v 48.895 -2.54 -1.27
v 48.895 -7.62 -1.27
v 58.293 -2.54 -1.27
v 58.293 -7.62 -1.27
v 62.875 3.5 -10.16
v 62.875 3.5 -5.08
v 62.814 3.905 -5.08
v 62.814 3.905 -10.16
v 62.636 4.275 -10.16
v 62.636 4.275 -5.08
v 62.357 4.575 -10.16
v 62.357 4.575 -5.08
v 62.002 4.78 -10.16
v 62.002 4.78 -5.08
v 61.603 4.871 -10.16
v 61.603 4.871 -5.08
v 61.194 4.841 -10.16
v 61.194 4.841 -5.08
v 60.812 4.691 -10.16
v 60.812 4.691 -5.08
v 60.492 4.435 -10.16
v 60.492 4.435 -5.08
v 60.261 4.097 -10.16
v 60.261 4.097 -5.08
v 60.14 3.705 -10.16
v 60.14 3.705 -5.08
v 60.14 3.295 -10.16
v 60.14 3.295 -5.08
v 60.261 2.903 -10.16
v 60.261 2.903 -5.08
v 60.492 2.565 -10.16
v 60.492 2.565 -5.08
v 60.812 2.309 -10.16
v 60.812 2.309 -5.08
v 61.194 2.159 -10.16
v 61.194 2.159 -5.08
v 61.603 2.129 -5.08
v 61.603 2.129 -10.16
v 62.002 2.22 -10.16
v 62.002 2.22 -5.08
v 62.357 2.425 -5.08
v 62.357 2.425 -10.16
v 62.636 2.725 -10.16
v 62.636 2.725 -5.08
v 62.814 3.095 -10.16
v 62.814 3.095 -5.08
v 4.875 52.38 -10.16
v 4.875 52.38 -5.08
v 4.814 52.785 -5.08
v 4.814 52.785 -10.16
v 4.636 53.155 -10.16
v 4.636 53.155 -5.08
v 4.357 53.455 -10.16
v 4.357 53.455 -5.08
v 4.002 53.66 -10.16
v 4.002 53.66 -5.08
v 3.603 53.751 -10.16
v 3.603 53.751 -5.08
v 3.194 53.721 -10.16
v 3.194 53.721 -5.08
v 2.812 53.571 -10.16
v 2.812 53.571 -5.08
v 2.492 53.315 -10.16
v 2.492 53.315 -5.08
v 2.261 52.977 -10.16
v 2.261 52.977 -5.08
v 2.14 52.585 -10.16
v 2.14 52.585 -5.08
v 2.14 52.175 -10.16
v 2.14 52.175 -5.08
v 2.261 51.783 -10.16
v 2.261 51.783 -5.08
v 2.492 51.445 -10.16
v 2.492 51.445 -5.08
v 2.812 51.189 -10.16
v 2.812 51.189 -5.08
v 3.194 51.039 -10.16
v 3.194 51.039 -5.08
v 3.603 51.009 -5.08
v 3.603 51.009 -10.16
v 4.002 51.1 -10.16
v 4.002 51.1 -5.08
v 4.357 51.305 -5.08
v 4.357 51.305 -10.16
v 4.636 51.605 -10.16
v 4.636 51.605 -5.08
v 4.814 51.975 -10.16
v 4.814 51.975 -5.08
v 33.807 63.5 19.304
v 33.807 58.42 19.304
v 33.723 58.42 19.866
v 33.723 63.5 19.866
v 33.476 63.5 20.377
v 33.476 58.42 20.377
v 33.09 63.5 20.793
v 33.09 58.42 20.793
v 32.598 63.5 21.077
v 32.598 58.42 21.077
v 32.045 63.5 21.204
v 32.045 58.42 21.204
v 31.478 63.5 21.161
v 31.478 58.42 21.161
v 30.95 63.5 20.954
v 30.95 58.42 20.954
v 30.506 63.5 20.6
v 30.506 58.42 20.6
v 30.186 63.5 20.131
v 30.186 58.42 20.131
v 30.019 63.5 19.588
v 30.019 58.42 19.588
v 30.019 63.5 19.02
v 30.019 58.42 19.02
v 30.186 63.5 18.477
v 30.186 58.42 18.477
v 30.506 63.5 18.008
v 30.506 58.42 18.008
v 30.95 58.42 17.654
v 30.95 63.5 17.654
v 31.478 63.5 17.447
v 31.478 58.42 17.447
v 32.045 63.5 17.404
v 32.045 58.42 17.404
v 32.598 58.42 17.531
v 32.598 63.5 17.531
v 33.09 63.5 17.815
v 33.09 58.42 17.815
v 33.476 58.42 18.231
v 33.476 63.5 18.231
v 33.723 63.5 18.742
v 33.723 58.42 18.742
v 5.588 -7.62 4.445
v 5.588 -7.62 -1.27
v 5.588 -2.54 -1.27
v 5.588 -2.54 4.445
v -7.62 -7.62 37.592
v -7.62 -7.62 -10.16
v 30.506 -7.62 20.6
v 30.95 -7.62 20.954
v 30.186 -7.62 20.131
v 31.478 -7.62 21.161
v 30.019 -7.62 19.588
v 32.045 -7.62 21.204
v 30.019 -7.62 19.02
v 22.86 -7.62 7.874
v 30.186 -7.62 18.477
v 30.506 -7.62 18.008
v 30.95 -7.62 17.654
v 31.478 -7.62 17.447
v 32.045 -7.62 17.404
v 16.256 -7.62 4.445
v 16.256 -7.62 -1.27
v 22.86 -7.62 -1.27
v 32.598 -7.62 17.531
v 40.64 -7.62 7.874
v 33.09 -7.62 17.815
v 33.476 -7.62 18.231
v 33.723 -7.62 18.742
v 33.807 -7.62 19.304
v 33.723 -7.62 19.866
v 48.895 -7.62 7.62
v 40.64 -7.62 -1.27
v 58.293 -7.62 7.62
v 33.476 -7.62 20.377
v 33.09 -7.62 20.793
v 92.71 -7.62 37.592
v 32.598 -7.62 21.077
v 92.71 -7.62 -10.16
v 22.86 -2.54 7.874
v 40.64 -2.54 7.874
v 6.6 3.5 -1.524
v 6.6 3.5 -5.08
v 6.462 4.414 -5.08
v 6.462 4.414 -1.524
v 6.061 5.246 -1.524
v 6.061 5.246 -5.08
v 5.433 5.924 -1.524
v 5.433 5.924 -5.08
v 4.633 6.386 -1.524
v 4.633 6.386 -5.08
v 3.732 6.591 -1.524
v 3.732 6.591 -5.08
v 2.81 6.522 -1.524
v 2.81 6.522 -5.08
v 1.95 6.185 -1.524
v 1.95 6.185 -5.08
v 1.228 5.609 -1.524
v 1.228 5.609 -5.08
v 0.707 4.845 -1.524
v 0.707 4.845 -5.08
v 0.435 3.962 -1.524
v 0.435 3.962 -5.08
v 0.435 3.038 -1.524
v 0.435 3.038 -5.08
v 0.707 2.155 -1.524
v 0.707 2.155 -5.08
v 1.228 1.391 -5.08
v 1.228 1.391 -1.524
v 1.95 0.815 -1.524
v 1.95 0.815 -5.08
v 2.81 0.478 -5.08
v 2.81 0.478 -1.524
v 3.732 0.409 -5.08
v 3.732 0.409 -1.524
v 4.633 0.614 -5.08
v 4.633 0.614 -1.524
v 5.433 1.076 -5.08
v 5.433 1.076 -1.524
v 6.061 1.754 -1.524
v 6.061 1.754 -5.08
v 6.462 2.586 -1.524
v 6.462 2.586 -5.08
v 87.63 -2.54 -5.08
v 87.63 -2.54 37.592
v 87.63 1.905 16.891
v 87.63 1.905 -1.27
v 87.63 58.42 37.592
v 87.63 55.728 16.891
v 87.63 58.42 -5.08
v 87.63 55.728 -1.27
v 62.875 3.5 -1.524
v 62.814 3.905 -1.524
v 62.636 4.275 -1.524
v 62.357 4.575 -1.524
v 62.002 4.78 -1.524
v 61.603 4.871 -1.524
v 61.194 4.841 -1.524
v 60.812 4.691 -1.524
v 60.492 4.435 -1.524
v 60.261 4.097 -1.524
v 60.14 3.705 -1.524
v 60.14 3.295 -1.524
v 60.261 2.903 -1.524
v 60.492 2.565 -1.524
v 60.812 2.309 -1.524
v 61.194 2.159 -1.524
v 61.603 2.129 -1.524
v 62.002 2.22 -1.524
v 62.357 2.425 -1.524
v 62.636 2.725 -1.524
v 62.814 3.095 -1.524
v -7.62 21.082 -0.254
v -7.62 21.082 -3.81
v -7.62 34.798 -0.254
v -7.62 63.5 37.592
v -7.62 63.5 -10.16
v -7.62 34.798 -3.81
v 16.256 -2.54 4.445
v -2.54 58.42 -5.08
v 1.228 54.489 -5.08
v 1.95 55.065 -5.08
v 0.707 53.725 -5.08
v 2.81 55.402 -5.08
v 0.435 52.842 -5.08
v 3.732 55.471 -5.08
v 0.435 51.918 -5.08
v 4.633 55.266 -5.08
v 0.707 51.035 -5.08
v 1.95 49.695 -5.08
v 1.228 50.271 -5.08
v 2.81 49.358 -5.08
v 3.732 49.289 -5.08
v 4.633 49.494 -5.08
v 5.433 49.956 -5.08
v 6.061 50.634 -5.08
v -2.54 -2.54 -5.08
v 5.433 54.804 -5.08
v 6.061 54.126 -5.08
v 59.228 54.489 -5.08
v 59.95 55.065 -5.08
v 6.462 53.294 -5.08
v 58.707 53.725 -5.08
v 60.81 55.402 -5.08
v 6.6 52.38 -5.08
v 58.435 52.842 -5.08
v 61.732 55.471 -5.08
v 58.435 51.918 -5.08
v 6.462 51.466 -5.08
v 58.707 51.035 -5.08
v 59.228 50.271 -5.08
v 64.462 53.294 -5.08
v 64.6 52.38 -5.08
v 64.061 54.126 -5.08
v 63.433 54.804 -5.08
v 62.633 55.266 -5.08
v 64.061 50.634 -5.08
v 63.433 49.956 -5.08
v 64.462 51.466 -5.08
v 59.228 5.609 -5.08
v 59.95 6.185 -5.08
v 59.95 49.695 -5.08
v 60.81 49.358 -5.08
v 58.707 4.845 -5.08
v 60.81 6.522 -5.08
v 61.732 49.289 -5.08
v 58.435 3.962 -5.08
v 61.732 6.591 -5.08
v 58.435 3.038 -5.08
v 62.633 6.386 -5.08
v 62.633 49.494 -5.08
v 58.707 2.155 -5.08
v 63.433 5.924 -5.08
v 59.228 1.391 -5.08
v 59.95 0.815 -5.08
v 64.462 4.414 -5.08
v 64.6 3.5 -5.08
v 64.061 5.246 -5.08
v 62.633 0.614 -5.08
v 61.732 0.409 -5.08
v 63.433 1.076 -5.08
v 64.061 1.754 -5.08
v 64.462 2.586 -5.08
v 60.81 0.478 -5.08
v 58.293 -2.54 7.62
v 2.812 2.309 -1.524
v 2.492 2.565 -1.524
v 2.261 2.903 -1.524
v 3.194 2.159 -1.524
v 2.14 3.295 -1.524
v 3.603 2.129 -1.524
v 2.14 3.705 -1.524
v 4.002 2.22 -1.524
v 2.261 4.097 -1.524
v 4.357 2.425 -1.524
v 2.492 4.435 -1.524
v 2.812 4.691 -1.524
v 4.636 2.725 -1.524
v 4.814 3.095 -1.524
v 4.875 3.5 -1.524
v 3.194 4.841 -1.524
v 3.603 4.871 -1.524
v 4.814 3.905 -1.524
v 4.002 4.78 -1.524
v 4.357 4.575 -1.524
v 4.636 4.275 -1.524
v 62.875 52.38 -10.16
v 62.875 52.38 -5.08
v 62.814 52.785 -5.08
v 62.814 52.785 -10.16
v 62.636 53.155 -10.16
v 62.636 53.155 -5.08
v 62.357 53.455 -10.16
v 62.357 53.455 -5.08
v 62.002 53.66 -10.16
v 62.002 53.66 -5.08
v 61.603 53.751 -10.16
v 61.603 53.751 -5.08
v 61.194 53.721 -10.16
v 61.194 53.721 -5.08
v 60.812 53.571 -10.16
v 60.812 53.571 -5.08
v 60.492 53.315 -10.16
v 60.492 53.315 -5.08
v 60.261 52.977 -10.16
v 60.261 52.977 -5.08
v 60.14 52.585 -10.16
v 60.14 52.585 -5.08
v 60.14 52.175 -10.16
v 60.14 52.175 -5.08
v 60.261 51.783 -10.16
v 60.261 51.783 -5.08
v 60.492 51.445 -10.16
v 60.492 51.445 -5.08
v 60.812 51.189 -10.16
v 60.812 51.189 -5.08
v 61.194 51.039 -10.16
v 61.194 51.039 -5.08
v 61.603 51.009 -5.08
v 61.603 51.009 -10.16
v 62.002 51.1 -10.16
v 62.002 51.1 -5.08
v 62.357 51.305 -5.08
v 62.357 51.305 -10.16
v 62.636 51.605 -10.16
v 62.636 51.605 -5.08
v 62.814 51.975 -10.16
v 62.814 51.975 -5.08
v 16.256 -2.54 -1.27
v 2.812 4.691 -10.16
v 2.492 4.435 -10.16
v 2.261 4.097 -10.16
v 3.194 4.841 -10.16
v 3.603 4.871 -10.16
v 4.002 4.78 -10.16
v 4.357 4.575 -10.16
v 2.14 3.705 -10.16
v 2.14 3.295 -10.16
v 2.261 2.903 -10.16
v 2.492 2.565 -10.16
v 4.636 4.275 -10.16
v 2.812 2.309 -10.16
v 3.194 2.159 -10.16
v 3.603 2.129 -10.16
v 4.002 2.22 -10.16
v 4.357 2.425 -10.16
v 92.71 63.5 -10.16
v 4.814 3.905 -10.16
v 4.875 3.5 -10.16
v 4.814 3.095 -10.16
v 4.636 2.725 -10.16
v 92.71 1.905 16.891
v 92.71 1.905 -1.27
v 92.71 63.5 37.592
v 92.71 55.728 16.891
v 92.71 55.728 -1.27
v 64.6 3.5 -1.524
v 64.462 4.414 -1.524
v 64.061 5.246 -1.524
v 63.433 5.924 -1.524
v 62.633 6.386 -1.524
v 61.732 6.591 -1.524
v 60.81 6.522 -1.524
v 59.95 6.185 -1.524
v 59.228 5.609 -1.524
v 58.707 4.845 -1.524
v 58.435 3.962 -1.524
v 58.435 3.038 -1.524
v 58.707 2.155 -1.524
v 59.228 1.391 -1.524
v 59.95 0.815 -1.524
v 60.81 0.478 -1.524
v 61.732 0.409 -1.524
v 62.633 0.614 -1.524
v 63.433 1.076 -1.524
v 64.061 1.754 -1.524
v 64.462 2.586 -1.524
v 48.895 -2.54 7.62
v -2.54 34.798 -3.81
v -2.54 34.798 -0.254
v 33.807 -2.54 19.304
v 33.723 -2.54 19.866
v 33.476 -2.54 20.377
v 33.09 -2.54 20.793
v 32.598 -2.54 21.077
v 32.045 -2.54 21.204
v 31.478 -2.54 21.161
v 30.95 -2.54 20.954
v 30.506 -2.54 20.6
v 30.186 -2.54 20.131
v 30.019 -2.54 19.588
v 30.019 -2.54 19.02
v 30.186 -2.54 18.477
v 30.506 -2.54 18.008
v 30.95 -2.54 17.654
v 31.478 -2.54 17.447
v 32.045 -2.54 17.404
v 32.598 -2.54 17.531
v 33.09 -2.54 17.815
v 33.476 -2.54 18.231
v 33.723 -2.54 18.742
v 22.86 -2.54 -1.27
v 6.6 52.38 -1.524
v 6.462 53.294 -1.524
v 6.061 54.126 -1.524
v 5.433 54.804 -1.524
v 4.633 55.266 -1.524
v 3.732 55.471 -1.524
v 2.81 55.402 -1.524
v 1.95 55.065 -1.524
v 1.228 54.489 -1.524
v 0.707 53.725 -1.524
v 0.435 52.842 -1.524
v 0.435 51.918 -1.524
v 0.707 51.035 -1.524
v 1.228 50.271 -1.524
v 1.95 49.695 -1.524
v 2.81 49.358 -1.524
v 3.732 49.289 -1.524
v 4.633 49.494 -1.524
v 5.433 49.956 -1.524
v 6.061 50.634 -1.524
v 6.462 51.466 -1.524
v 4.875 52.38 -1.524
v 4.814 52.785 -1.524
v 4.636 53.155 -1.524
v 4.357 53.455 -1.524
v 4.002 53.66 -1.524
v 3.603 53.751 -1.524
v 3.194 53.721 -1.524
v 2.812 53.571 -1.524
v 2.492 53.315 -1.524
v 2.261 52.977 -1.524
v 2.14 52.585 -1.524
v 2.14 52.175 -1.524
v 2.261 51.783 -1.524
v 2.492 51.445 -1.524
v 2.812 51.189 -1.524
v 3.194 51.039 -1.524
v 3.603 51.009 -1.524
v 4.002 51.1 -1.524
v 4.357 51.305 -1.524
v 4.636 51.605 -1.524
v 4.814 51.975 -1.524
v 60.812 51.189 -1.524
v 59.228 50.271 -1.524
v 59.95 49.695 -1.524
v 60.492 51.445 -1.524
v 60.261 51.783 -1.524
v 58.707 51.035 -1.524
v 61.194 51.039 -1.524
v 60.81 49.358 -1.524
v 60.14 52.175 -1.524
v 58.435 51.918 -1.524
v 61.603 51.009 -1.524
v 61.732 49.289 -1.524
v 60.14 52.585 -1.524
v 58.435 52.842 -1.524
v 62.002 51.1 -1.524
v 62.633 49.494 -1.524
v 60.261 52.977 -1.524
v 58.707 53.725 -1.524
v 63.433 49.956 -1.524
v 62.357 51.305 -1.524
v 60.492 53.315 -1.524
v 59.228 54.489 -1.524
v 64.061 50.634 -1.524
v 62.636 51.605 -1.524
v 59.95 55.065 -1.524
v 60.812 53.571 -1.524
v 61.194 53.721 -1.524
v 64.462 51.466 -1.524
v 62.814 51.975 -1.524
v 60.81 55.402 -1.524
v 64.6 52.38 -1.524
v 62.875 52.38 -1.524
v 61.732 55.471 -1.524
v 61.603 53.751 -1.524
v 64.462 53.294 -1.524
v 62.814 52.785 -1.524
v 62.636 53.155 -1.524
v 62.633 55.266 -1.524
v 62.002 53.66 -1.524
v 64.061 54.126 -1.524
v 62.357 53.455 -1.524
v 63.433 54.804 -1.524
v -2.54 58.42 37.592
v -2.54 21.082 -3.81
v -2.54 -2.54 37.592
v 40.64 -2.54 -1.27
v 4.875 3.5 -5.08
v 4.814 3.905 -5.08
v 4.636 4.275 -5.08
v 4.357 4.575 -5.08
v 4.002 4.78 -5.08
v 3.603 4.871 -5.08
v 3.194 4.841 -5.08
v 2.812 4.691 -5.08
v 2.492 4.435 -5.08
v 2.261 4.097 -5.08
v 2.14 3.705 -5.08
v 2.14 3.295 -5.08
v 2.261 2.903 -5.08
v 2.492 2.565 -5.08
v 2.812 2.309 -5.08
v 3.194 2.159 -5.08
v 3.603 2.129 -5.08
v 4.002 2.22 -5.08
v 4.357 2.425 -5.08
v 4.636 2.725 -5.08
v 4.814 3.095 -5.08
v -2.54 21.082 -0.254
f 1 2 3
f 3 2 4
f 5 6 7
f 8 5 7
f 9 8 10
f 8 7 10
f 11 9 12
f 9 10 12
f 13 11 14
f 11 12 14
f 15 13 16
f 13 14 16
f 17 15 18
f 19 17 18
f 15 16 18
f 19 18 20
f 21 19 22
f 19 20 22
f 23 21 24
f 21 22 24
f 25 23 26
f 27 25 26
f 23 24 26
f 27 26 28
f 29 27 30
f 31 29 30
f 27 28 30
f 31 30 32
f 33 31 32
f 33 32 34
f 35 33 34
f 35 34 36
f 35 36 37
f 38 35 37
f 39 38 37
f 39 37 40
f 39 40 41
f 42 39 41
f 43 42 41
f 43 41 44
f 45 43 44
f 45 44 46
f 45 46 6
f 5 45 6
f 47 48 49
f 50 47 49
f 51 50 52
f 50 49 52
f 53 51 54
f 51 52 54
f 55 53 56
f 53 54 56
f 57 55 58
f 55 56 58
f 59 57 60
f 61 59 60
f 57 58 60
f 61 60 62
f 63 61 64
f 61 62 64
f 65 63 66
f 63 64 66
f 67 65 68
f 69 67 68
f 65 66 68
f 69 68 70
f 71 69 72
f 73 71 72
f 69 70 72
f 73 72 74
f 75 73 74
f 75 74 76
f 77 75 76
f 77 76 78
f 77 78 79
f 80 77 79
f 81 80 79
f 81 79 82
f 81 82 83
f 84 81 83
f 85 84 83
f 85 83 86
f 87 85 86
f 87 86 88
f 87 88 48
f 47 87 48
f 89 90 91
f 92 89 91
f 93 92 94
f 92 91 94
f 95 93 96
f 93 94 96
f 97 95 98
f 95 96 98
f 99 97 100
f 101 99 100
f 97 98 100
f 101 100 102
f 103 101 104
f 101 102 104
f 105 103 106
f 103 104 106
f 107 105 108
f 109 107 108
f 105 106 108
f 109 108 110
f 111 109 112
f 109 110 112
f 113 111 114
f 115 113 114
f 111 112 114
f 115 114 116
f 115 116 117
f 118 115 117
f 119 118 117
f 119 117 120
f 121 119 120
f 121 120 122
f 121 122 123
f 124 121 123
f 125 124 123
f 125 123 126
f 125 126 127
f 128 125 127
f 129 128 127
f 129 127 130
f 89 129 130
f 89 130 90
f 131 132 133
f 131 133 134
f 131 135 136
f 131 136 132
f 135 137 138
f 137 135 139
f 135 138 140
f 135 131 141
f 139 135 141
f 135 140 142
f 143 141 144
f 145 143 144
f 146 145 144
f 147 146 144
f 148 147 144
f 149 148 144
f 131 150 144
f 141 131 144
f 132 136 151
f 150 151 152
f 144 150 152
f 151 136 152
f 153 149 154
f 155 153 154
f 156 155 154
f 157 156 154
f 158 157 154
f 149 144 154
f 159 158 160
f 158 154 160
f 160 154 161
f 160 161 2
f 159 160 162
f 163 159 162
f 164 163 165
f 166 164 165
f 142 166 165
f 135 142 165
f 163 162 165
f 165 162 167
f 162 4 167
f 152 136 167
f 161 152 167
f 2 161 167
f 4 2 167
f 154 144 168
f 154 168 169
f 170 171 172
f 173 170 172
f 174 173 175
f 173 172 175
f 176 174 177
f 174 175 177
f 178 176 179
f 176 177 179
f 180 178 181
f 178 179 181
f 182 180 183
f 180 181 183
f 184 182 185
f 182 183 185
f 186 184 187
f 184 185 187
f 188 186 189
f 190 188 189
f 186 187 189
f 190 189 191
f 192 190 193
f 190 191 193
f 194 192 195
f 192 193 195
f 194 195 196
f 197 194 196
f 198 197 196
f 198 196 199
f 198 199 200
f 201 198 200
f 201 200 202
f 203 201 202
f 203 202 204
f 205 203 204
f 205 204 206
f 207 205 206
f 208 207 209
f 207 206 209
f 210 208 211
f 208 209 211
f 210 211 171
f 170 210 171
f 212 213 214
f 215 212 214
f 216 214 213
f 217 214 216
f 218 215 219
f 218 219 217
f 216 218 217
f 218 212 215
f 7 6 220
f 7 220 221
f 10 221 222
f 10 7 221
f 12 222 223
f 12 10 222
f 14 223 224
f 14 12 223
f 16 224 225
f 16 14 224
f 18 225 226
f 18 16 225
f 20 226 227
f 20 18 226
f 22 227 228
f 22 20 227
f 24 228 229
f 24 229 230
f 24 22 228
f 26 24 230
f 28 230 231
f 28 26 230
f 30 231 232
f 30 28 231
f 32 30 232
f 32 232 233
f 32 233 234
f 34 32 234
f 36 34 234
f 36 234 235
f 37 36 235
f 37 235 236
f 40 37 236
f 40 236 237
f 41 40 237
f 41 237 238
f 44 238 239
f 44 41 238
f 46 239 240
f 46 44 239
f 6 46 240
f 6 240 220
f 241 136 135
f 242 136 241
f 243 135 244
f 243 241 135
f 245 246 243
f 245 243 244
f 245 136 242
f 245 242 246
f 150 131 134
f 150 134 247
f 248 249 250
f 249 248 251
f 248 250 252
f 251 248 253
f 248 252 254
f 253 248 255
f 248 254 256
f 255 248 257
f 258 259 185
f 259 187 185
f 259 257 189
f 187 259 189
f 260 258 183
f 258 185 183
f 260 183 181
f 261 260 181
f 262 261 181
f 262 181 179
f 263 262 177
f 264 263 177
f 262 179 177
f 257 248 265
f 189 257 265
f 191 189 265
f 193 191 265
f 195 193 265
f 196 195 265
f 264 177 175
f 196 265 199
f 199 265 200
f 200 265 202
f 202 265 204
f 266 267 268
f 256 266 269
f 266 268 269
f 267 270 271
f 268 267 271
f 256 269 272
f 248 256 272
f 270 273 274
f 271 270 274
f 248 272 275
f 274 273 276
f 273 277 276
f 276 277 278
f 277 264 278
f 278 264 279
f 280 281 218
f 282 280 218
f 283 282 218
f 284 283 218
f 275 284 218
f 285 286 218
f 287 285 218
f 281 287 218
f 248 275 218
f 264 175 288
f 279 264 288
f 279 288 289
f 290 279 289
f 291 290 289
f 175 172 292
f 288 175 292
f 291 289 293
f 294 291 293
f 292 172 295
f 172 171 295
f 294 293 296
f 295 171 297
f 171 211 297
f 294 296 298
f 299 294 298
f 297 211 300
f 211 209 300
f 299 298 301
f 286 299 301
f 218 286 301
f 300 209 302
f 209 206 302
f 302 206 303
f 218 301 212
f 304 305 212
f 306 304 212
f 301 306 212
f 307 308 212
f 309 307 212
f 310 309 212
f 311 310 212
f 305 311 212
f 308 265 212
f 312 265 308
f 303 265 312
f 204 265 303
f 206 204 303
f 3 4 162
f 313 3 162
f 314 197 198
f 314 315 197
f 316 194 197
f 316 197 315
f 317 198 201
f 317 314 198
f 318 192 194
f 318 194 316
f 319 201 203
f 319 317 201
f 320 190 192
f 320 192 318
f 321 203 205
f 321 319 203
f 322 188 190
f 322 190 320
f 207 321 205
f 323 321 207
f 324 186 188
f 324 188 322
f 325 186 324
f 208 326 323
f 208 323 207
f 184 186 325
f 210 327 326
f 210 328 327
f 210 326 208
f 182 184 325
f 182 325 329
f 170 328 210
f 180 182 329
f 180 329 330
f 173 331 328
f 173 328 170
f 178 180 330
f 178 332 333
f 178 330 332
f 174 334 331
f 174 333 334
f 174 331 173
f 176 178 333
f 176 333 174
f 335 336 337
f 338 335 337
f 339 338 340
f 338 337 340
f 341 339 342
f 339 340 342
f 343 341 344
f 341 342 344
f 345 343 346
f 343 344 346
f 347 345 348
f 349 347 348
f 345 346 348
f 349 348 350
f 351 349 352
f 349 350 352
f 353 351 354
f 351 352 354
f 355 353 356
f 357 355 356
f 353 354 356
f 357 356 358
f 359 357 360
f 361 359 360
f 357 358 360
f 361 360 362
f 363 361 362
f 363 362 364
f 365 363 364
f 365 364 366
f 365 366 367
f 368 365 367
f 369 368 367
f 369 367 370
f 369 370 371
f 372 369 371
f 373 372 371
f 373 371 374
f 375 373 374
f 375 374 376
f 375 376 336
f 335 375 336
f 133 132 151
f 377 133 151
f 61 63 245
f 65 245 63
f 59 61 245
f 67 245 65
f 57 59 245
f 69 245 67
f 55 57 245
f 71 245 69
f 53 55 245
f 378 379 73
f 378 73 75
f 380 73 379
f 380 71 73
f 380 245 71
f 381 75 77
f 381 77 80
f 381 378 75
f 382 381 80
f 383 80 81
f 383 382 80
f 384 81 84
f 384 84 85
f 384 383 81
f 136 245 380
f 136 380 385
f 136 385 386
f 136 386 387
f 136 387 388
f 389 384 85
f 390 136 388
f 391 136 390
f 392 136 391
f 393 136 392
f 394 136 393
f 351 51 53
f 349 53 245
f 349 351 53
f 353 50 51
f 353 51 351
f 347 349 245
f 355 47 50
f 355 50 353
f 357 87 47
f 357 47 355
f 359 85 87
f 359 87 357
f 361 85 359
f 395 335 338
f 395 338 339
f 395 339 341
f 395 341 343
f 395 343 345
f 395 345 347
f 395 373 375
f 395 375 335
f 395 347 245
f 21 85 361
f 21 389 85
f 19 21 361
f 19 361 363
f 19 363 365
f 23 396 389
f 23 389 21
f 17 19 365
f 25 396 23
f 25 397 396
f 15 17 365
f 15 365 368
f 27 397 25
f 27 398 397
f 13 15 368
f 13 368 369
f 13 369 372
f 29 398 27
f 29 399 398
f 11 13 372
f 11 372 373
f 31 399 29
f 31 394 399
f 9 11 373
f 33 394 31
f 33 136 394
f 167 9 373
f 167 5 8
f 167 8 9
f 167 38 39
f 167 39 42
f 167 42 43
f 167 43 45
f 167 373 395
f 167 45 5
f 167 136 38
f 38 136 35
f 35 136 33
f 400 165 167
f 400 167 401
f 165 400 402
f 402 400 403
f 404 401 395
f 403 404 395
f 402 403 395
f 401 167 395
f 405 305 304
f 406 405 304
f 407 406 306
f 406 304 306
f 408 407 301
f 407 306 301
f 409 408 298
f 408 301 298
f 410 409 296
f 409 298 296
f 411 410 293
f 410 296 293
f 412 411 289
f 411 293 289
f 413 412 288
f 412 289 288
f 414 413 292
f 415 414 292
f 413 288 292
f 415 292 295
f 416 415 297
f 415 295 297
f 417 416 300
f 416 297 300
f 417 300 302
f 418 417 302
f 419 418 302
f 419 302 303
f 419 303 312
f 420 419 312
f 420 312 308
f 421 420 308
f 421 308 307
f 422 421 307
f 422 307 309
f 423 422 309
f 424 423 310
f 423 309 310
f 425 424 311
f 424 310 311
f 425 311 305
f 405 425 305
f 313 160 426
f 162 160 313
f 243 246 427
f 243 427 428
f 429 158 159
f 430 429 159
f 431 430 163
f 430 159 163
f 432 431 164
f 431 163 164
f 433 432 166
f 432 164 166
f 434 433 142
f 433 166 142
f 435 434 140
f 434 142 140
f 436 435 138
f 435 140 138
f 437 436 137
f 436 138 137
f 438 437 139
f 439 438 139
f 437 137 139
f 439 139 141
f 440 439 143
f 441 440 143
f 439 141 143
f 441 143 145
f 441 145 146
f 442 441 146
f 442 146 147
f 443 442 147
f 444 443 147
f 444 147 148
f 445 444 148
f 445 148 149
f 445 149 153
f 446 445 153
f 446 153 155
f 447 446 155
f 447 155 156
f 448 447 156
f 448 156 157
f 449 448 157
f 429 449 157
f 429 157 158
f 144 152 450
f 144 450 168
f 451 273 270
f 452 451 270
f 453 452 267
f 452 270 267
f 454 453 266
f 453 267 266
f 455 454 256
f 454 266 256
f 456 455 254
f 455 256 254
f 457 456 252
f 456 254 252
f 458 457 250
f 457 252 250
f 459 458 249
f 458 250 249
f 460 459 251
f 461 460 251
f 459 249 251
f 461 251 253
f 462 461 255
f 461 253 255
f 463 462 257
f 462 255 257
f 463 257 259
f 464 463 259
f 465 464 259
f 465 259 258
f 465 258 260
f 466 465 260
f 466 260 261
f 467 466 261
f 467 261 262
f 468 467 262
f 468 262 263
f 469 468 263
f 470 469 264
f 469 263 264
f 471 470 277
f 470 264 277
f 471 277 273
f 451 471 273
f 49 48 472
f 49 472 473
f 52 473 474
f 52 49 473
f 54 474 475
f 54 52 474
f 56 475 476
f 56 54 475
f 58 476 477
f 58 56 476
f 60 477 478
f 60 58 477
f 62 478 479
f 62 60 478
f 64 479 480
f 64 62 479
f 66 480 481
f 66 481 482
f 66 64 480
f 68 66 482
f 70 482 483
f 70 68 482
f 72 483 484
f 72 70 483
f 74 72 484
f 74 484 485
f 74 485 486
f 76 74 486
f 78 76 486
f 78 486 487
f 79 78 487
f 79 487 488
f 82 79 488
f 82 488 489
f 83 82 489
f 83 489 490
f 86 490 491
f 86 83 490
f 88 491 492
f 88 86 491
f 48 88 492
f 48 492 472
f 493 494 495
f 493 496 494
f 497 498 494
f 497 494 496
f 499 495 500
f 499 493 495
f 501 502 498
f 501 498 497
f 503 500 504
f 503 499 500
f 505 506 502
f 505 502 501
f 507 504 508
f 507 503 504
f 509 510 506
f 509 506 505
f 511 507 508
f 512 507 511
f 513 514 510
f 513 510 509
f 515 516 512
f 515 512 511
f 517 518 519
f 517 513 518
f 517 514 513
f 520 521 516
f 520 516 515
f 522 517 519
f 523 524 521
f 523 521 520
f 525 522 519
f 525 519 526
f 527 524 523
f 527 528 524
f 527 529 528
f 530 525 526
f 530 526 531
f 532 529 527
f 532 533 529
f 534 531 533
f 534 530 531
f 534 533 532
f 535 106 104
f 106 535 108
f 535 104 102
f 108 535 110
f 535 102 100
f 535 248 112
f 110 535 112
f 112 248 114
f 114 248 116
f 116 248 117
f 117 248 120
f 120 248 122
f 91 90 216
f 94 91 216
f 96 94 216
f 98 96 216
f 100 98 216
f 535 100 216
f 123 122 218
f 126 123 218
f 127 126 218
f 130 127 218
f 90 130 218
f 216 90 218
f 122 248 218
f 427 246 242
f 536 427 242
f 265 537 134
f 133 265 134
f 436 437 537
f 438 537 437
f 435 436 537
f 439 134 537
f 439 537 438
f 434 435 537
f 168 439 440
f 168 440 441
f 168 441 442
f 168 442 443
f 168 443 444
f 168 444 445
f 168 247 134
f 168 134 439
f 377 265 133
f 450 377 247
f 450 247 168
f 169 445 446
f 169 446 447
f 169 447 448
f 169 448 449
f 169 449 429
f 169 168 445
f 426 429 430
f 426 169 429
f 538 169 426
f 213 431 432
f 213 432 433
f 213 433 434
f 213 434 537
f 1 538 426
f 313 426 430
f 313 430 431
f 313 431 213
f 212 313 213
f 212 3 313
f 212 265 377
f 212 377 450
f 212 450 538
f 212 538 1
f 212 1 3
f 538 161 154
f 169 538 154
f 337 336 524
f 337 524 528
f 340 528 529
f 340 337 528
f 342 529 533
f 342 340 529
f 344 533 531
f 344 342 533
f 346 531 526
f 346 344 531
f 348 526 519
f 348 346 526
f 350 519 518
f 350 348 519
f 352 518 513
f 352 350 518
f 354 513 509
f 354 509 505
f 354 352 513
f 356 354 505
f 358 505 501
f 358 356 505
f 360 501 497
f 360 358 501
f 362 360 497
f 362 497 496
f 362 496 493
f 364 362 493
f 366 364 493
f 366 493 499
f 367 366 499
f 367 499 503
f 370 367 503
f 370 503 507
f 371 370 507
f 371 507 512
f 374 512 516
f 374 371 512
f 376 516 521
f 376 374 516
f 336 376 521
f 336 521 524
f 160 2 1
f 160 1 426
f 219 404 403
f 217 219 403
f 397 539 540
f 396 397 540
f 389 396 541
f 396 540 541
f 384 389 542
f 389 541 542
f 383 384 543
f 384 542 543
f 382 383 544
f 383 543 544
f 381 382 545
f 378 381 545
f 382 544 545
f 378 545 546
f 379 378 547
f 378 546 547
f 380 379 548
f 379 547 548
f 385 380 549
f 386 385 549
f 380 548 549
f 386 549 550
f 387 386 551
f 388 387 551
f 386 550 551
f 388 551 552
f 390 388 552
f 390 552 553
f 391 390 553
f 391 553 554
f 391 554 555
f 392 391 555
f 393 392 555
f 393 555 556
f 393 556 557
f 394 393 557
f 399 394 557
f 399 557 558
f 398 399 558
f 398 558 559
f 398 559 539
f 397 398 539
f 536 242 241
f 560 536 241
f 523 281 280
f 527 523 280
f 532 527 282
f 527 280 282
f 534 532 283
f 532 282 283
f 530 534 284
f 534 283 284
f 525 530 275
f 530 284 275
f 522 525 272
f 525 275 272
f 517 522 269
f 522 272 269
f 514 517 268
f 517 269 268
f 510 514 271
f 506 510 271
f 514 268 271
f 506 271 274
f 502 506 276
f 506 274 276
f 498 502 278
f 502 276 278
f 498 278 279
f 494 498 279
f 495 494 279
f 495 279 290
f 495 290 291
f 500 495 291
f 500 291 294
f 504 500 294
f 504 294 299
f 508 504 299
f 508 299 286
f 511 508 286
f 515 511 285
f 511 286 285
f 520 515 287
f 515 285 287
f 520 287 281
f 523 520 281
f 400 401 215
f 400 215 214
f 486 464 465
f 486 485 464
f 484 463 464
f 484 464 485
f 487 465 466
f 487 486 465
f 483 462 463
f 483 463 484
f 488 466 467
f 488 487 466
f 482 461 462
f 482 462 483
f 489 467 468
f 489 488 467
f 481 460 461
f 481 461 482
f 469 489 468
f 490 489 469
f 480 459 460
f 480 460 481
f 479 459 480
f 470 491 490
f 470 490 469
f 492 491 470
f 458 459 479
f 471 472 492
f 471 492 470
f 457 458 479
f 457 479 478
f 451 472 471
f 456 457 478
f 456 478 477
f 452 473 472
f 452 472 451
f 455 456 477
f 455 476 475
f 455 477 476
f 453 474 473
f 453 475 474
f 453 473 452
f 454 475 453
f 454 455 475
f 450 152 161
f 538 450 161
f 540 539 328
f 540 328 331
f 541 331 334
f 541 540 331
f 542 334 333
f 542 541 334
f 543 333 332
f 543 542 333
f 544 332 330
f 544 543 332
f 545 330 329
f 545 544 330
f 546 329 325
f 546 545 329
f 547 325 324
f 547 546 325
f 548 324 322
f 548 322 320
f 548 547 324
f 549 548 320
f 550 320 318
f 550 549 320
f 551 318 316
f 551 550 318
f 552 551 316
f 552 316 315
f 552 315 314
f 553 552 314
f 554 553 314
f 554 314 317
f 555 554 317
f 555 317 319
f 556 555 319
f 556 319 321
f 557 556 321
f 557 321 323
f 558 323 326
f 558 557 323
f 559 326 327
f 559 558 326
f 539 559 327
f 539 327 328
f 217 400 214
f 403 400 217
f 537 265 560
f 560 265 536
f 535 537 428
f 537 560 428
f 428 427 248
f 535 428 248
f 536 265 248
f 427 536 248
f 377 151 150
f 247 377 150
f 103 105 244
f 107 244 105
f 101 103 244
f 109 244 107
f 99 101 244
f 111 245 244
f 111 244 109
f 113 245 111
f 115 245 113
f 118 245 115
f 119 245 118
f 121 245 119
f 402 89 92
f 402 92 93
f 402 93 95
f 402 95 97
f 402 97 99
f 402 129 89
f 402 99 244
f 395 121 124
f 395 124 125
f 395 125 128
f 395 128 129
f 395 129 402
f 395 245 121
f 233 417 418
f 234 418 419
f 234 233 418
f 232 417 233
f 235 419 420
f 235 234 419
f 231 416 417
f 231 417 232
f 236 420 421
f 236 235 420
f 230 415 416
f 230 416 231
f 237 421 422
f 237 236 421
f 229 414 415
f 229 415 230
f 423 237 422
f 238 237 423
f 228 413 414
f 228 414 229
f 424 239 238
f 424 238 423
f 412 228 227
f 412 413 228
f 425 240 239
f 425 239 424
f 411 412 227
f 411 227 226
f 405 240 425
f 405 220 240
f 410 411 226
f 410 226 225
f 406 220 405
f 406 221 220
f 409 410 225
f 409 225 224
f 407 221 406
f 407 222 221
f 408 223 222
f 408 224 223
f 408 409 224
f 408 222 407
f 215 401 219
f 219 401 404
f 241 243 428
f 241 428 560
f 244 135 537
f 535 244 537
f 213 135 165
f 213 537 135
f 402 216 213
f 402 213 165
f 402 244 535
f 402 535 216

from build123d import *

# Parameters (mm, degrees)
F0_W      = 100.33
F0_H      = 71.12
F0_W_2    = 90.17
F0_H_2    = 60.96
F1_DEPTH  = 5.08
F2_W      = 100.33
F2_H      = 71.12
F3_DEPTH  = 5.08
F0_R      = 1.375
F4_DEPTH  = 25.4
F5_R      = 3.1
F5_R_2    = 1.375
F6_DEPTH  = 3.556
F7_DEPTH  = 37.592
F8_W      = 13.716
F8_H      = 3.556
F9_DEPTH  = 5.08
F10_W     = 10.668
F10_H     = 5.715
F10_W_2   = 17.78
F10_H_2   = 9.144
F10_W_3   = 9.398
F10_H_3   = 8.89
F11_DEPTH = 5.08
F12_W     = 53.8226
F12_H     = 18.161
F13_DEPTH = 5.08
F14_R     = 1.905
F15_DEPTH = 71.121


with BuildPart() as f1:
    # F0 (on Top) → F1 (new body)
    with BuildSketch(Plane.XY):
        with Locations((42.545, 27.94)):
            Rectangle(F0_W, F0_H)
        with Locations((42.545, 27.94)):
            Rectangle(F0_W_2, F0_H_2, mode=Mode.SUBTRACT)
    extrude(amount=-F1_DEPTH)

    # F2 (on face) → F3 (join)
    with BuildSketch(Plane(origin=(0, 0, -5.08), x_dir=(1, 0, 0), z_dir=(0, 0, -1))):
        with Locations((42.545, -27.94)):
            Rectangle(F2_W, F2_H)
    extrude(amount=F3_DEPTH)

    # F0 (on Top) → F4 (cut)
    with BuildSketch(Plane.XY):
        with Locations((3.5, 52.38)):
            Circle(F0_R)
        with Locations((61.5, 52.38)):
            Circle(F0_R)
        with Locations((61.5, 3.5)):
            Circle(F0_R)
        with Locations((3.5, 3.5)):
            Circle(F0_R)
    extrude(amount=-F4_DEPTH, mode=Mode.SUBTRACT)

    # F5 (on face) → F6 (join)
    with BuildSketch(Plane.XY.offset(-5.08)):
        with Locations((3.5, 52.38)):
            Circle(F5_R)
        with Locations((3.5, 52.38)):
            Circle(F5_R_2, mode=Mode.SUBTRACT)
        with Locations((61.5, 52.38)):
            Circle(F5_R)
        with Locations((61.5, 52.38)):
            Circle(F5_R_2, mode=Mode.SUBTRACT)
        with Locations((61.5, 3.5)):
            Circle(F5_R)
        with Locations((61.5, 3.5)):
            Circle(F5_R_2, mode=Mode.SUBTRACT)
        with Locations((3.5, 3.5)):
            Circle(F5_R)
        with Locations((3.5, 3.5)):
            Circle(F5_R_2, mode=Mode.SUBTRACT)
    extrude(amount=F6_DEPTH)

    # F0 (on Top) → F7 (join)
    with BuildSketch(Plane.XY):
        with Locations((42.545, 27.94)):
            Rectangle(F0_W, F0_H)
        with Locations((42.545, 27.94)):
            Rectangle(F0_W_2, F0_H_2, mode=Mode.SUBTRACT)
    extrude(amount=F7_DEPTH)

    # F8 (on face) → F9 (cut, through all)
    with BuildSketch(Plane(origin=(-7.62, 0, 0), x_dir=(0, -1, 0), z_dir=(-1, 0, 0))):
        with Locations((-27.94, -2.032)):
            Rectangle(F8_W, F8_H)
    extrude(amount=-F9_DEPTH, mode=Mode.SUBTRACT)

    # F10 (on face) → F11 (cut, through all)
    with BuildSketch(Plane.XZ.offset(7.62)):
        with Locations((10.922, 1.5875)):
            Rectangle(F10_W, F10_H)
        with Locations((31.75, 3.302)):
            Rectangle(F10_W_2, F10_H_2)
        with Locations((53.594, 3.175)):
            Rectangle(F10_W_3, F10_H_3)
    extrude(amount=-F11_DEPTH, mode=Mode.SUBTRACT)

    # F12 (on face) → F13 (cut, through all)
    with BuildSketch(Plane.YZ.offset(92.71)):
        with Locations((28.8163, 7.8105)):
            Rectangle(F12_W, F12_H)
    extrude(amount=-F13_DEPTH, mode=Mode.SUBTRACT)

    # F14 (on face) → F15 (cut, through all)
    with BuildSketch(Plane.XZ.offset(7.62)):
        with Locations((31.9024, 19.304)):
            Circle(F14_R)
    extrude(amount=-F15_DEPTH, mode=Mode.SUBTRACT)


solid = f1.part
